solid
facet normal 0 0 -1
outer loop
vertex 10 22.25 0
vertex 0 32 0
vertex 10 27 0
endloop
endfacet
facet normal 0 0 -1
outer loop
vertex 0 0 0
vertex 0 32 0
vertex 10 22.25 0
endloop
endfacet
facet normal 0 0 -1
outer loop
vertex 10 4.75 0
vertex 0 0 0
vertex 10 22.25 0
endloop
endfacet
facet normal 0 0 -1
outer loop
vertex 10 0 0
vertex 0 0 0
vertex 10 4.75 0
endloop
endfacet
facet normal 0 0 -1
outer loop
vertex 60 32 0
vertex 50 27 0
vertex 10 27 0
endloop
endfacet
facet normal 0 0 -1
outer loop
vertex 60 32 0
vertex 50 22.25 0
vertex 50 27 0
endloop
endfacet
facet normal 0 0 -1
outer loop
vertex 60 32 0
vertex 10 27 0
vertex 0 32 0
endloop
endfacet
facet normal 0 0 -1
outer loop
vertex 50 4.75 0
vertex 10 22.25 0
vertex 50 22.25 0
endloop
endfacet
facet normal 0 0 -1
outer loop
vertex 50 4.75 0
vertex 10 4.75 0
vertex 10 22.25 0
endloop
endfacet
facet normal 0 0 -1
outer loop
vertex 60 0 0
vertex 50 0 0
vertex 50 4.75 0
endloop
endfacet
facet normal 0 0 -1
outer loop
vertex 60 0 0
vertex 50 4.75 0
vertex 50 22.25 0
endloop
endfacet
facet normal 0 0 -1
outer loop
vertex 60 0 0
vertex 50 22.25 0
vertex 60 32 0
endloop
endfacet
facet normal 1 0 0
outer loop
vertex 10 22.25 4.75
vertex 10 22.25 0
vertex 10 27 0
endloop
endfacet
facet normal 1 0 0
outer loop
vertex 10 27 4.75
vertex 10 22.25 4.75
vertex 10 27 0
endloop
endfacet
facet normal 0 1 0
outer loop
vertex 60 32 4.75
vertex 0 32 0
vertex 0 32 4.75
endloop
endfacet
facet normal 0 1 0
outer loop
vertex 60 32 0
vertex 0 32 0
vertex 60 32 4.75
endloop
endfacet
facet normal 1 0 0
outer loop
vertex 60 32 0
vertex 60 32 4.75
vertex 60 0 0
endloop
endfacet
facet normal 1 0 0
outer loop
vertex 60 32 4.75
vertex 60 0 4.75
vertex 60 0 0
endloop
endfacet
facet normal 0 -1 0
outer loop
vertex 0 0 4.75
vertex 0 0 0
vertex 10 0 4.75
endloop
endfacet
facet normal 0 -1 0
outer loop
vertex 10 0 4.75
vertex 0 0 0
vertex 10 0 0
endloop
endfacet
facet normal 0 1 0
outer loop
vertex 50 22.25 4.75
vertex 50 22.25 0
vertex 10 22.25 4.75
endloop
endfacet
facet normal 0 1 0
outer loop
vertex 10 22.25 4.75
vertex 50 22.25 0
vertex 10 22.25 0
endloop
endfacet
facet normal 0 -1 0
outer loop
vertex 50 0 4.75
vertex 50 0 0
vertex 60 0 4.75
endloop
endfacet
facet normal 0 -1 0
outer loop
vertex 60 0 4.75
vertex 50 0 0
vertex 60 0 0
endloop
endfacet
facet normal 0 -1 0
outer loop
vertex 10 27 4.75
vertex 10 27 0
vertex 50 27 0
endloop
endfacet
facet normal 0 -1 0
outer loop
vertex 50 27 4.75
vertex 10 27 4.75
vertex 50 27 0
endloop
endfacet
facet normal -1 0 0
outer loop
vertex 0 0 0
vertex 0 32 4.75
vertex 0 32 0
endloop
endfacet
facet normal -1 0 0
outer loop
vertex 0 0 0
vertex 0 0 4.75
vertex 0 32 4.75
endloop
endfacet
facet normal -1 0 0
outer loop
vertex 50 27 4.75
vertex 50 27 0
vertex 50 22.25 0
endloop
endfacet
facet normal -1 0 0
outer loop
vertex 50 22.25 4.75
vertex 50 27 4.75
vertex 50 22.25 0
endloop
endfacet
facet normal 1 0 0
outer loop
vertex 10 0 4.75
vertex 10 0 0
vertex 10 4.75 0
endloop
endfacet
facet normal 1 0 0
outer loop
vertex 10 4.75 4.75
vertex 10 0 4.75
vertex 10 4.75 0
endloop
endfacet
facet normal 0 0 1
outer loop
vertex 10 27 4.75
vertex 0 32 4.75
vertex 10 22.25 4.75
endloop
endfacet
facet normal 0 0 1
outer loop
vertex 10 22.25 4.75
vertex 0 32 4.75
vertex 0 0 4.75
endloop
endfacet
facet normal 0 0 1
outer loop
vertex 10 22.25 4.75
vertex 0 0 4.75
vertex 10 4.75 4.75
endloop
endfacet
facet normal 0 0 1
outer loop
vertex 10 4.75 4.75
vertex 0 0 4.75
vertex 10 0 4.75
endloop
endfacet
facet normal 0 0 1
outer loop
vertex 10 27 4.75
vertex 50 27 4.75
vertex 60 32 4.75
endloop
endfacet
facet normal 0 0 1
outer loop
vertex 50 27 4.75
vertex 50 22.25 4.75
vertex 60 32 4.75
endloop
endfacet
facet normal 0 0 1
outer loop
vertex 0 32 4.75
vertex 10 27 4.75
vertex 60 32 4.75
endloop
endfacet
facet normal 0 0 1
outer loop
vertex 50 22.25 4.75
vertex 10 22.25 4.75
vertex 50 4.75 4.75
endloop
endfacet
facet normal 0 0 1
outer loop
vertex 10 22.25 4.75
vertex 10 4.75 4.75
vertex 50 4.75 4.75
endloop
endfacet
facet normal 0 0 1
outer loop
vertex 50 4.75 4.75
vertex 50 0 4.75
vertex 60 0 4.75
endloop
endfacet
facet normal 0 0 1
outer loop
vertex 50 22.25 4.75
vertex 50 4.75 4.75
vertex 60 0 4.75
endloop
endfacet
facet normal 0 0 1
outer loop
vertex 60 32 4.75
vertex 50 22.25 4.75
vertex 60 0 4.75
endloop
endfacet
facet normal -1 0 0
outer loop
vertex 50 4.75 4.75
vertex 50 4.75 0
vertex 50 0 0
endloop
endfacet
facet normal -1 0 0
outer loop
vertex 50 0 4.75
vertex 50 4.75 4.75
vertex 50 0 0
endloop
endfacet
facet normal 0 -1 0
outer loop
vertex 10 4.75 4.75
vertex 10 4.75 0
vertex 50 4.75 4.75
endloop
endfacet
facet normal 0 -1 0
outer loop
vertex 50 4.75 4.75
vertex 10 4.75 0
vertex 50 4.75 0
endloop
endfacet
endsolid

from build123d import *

# Parameters (mm, degrees)
BOSS_EXTRUDE1_DEPTH = 4.75
SKETCH2_W           = 60
SKETCH2_H           = 4.75
BOSS_EXTRUDE2_DEPTH = 5


with BuildPart() as part:
    # Sketch1 → Boss-Extrude1 (new body)
    with BuildSketch(Plane.XY):
        Polygon((0, 0), (10, 0), (10, 4.75), (50, 4.75), (50, 0), (60, 0), (60, 27), (50, 27), (50, 22.25), (10, 22.25), (10, 27), (0, 27), align=None)
    extrude(amount=BOSS_EXTRUDE1_DEPTH)

    # Sketch2 → Boss-Extrude2 (add)
    with BuildSketch(Plane(origin=(0, 27, 0), x_dir=(1, 0, 0), z_dir=(0, 1, 0))):
        with Locations((30, -2.375)):
            Rectangle(SKETCH2_W, SKETCH2_H)
    extrude(amount=BOSS_EXTRUDE2_DEPTH)


solid = part.part
